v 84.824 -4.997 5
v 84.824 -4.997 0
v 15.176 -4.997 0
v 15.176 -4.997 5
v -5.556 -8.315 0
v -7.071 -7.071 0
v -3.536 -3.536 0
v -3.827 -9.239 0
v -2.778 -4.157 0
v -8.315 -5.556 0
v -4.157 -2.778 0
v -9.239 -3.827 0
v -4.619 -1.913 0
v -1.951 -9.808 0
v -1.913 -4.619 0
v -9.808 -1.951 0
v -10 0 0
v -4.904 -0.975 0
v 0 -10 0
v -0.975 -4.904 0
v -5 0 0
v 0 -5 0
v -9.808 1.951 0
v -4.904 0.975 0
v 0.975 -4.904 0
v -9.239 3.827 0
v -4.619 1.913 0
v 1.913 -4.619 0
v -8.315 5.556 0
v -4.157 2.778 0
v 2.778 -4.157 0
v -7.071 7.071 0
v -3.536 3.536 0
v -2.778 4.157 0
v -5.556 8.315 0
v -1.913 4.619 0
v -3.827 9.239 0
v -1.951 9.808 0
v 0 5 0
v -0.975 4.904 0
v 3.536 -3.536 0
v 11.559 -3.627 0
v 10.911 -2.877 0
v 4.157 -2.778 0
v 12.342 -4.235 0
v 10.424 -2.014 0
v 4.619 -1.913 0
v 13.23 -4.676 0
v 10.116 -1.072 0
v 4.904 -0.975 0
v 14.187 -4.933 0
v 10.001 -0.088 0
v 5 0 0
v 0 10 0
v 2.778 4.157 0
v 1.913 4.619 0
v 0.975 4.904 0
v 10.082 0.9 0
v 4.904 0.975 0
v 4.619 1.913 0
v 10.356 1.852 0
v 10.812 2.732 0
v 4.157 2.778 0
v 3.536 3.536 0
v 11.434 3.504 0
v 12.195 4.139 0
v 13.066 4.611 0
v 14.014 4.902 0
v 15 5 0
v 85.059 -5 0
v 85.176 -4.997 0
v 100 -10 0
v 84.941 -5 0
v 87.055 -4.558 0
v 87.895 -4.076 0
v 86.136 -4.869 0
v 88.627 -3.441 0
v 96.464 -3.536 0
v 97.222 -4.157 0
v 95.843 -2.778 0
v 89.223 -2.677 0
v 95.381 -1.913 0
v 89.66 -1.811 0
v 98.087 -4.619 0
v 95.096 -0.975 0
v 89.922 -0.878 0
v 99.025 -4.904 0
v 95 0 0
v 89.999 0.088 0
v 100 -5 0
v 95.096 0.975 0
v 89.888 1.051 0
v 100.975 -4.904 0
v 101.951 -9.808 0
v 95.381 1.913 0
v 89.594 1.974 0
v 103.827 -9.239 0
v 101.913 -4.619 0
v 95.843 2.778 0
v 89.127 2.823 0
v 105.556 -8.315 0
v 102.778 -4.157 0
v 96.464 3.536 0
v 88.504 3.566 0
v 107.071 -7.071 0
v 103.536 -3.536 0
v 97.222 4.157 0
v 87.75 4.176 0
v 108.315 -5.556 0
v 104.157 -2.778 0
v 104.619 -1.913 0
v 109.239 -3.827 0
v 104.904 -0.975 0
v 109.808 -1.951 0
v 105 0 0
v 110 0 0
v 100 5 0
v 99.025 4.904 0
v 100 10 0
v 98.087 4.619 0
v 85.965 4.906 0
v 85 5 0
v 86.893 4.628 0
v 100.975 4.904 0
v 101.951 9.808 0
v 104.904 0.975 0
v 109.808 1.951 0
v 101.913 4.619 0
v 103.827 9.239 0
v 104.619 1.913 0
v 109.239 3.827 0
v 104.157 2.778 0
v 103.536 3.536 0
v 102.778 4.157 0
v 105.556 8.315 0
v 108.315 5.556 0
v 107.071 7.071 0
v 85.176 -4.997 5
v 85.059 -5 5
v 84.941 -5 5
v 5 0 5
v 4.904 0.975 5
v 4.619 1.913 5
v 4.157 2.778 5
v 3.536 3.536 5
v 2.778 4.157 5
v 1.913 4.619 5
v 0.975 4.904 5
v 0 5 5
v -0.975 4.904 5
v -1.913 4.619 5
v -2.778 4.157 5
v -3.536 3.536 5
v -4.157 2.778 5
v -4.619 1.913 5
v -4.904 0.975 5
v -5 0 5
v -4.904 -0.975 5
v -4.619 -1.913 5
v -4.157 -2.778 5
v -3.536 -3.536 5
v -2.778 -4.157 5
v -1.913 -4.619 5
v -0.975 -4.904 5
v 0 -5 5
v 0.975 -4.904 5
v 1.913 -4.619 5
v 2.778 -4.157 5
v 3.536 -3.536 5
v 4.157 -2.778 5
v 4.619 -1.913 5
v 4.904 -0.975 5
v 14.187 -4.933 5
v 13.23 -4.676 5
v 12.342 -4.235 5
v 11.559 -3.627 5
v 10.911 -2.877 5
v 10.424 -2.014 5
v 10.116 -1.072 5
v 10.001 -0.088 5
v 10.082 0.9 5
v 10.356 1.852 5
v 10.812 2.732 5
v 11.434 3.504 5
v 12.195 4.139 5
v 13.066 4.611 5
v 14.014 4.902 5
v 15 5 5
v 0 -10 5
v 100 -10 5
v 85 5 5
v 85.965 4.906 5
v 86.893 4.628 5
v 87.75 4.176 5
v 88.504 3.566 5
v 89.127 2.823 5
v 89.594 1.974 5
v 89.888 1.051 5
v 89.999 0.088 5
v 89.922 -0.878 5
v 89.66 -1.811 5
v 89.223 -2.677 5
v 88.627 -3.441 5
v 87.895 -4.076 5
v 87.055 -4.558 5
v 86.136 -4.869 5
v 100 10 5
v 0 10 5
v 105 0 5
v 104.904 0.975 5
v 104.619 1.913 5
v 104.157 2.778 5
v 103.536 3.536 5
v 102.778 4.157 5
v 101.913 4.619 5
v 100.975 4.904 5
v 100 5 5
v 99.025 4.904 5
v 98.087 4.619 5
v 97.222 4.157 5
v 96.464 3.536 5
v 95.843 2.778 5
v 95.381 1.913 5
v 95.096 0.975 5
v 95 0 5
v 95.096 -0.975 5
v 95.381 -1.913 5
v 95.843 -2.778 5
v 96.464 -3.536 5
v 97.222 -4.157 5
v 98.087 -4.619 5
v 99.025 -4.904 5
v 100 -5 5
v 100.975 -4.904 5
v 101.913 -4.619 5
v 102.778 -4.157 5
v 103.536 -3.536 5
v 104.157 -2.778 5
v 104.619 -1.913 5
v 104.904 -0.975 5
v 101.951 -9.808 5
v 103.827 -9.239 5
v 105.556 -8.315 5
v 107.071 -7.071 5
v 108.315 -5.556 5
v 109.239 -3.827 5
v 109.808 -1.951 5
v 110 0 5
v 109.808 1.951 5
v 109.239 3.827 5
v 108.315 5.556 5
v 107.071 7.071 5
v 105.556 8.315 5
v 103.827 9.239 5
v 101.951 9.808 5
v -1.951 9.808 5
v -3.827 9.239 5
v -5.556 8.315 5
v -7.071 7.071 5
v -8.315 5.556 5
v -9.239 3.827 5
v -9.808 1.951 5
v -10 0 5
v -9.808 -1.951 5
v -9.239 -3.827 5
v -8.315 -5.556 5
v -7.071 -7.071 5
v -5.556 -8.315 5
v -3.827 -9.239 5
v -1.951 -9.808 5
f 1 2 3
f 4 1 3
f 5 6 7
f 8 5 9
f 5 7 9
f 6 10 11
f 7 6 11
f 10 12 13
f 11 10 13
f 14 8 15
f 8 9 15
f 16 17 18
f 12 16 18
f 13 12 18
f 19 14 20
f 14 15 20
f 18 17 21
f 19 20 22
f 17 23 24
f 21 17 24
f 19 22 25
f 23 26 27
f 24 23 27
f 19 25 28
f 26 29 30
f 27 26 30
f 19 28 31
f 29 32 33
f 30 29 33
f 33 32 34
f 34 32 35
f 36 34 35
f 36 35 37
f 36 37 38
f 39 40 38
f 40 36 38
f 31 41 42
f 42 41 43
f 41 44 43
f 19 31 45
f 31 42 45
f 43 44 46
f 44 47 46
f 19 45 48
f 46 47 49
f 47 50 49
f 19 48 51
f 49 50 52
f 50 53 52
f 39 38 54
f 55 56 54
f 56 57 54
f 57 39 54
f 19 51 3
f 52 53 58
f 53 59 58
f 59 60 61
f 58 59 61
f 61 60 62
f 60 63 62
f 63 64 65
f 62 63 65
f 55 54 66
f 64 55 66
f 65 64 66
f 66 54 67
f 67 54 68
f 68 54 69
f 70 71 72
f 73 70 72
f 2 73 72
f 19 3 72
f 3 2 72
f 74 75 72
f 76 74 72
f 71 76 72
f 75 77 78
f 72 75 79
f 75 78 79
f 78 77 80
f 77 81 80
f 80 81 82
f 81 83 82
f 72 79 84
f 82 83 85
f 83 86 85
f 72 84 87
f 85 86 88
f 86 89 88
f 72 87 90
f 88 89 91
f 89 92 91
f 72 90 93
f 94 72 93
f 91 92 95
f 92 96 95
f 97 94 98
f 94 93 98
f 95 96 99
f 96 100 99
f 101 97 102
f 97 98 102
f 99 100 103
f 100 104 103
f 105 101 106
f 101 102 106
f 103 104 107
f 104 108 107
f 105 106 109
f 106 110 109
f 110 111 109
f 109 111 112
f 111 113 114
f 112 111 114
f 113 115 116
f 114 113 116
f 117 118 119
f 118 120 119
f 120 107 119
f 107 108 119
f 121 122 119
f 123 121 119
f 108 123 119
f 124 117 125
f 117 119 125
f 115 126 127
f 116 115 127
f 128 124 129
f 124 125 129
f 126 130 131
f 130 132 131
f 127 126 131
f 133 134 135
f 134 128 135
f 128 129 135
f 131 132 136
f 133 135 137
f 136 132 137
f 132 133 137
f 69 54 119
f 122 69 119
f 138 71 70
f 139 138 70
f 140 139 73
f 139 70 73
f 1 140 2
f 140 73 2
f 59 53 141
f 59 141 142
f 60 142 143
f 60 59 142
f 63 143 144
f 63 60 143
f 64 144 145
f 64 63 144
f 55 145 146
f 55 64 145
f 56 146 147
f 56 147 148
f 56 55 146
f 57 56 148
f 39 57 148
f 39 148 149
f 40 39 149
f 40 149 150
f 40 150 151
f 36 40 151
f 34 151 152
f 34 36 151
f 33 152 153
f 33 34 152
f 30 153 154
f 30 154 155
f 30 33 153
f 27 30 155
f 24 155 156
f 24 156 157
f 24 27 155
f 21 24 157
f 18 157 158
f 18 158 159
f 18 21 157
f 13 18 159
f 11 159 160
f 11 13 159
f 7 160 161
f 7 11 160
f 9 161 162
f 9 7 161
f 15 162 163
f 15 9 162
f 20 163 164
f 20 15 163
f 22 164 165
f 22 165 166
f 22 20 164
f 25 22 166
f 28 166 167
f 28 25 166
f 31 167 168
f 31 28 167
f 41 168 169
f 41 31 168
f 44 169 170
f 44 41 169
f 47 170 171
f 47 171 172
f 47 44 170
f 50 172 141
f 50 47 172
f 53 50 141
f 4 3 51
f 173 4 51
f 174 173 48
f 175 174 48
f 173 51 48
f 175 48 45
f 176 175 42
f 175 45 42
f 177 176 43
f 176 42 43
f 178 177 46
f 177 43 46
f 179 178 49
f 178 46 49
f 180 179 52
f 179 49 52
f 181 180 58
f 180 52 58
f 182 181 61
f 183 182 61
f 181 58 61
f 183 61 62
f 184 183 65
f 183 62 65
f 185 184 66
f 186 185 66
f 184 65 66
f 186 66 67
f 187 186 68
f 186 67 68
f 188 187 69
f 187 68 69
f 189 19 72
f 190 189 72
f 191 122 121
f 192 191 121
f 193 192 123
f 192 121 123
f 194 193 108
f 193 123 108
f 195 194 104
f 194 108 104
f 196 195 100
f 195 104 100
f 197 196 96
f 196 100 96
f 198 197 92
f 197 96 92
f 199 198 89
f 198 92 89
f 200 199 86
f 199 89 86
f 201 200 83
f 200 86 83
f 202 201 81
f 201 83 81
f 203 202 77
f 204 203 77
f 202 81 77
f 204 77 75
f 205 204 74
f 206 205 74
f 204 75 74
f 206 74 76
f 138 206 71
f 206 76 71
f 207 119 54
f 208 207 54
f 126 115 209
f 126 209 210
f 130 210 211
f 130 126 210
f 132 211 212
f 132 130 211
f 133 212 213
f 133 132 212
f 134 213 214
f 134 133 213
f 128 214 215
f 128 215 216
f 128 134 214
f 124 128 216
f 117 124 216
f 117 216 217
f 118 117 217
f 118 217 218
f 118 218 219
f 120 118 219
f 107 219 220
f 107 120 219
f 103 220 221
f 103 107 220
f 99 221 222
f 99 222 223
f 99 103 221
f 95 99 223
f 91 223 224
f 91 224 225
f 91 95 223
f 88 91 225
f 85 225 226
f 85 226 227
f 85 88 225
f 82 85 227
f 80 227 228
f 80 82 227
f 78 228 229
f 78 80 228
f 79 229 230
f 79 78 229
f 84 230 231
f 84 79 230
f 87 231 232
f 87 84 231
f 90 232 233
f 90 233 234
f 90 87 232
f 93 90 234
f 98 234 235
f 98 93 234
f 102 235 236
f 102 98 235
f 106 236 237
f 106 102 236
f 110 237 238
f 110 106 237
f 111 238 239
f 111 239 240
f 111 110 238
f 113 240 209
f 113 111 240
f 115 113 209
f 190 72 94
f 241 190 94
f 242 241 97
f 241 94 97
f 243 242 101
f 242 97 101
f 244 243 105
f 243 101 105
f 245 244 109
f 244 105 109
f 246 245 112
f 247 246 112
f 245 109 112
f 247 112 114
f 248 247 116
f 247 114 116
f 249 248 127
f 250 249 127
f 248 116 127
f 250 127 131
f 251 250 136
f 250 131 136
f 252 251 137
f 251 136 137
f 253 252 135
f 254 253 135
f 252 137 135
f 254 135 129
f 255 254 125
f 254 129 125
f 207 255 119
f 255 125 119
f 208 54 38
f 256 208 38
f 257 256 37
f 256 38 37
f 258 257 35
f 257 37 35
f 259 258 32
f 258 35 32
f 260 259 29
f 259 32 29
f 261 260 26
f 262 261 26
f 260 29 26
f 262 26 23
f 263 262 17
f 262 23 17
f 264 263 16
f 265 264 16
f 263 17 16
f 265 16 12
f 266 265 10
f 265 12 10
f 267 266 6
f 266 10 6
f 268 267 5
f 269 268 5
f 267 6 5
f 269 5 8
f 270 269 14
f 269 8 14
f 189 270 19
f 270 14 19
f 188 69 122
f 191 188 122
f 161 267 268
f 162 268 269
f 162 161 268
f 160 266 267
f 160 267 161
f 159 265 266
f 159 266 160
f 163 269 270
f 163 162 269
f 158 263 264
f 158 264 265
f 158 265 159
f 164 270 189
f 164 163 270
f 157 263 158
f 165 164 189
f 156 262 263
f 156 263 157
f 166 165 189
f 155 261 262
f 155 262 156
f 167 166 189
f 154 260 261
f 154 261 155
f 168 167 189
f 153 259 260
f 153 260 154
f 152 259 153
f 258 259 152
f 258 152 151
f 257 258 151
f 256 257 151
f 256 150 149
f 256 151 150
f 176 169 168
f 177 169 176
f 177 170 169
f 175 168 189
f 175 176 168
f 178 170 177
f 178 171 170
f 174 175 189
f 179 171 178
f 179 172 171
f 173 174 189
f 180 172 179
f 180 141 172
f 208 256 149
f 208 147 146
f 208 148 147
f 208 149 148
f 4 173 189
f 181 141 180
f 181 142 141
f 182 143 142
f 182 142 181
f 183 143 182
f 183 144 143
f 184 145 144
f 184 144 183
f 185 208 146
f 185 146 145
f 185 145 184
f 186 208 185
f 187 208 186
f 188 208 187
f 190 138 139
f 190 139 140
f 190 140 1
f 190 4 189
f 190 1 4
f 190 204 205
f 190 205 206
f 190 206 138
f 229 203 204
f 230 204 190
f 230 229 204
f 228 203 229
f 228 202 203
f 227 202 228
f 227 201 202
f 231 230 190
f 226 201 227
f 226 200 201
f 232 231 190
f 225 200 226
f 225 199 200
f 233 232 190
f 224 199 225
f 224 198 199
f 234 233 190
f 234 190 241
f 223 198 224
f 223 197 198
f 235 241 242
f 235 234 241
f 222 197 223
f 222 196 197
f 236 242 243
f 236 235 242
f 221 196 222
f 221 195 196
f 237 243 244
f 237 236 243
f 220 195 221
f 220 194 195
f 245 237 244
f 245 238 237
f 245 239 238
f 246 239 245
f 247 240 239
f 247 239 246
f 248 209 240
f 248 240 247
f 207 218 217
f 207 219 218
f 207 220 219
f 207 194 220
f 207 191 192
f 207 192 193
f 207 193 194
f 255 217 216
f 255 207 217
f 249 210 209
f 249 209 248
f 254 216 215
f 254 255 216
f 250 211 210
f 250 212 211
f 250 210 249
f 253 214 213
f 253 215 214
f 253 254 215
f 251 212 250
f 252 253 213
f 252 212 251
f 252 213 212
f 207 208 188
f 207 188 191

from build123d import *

# Parameters (mm, degrees)
F0_R     = 5
F1_DEPTH = 5


with BuildPart() as f1:
    # F0 (on Top) → F1 (new body)
    with BuildSketch(Plane.XY):
        with BuildLine():
            Line((100, 10), (0, 10))
            ThreePointArc((0, 10), (-10, 0), (0, -10))
            Line((0, -10), (100, -10))
            ThreePointArc((100, -10), (110, 0), (100, 10))
        make_face()
        Circle(F0_R, mode=Mode.SUBTRACT)
        with BuildLine():
            ThreePointArc((15.175696, -4.996912), (10.000772, -0.087862), (15, 5))
            Line((15, 5), (85, 5))
            ThreePointArc((85, 5), (89.999228, 0.087862), (85.175696, -4.996912))
            ThreePointArc((85.175696, -4.996912), (85, -5), (84.824304, -4.996912))
            Line((84.824304, -4.996912), (15.175696, -4.996912))
        make_face(mode=Mode.SUBTRACT)
        with Locations((100, 0)):
            Circle(F0_R, mode=Mode.SUBTRACT)
    extrude(amount=F1_DEPTH)


solid = f1.part
